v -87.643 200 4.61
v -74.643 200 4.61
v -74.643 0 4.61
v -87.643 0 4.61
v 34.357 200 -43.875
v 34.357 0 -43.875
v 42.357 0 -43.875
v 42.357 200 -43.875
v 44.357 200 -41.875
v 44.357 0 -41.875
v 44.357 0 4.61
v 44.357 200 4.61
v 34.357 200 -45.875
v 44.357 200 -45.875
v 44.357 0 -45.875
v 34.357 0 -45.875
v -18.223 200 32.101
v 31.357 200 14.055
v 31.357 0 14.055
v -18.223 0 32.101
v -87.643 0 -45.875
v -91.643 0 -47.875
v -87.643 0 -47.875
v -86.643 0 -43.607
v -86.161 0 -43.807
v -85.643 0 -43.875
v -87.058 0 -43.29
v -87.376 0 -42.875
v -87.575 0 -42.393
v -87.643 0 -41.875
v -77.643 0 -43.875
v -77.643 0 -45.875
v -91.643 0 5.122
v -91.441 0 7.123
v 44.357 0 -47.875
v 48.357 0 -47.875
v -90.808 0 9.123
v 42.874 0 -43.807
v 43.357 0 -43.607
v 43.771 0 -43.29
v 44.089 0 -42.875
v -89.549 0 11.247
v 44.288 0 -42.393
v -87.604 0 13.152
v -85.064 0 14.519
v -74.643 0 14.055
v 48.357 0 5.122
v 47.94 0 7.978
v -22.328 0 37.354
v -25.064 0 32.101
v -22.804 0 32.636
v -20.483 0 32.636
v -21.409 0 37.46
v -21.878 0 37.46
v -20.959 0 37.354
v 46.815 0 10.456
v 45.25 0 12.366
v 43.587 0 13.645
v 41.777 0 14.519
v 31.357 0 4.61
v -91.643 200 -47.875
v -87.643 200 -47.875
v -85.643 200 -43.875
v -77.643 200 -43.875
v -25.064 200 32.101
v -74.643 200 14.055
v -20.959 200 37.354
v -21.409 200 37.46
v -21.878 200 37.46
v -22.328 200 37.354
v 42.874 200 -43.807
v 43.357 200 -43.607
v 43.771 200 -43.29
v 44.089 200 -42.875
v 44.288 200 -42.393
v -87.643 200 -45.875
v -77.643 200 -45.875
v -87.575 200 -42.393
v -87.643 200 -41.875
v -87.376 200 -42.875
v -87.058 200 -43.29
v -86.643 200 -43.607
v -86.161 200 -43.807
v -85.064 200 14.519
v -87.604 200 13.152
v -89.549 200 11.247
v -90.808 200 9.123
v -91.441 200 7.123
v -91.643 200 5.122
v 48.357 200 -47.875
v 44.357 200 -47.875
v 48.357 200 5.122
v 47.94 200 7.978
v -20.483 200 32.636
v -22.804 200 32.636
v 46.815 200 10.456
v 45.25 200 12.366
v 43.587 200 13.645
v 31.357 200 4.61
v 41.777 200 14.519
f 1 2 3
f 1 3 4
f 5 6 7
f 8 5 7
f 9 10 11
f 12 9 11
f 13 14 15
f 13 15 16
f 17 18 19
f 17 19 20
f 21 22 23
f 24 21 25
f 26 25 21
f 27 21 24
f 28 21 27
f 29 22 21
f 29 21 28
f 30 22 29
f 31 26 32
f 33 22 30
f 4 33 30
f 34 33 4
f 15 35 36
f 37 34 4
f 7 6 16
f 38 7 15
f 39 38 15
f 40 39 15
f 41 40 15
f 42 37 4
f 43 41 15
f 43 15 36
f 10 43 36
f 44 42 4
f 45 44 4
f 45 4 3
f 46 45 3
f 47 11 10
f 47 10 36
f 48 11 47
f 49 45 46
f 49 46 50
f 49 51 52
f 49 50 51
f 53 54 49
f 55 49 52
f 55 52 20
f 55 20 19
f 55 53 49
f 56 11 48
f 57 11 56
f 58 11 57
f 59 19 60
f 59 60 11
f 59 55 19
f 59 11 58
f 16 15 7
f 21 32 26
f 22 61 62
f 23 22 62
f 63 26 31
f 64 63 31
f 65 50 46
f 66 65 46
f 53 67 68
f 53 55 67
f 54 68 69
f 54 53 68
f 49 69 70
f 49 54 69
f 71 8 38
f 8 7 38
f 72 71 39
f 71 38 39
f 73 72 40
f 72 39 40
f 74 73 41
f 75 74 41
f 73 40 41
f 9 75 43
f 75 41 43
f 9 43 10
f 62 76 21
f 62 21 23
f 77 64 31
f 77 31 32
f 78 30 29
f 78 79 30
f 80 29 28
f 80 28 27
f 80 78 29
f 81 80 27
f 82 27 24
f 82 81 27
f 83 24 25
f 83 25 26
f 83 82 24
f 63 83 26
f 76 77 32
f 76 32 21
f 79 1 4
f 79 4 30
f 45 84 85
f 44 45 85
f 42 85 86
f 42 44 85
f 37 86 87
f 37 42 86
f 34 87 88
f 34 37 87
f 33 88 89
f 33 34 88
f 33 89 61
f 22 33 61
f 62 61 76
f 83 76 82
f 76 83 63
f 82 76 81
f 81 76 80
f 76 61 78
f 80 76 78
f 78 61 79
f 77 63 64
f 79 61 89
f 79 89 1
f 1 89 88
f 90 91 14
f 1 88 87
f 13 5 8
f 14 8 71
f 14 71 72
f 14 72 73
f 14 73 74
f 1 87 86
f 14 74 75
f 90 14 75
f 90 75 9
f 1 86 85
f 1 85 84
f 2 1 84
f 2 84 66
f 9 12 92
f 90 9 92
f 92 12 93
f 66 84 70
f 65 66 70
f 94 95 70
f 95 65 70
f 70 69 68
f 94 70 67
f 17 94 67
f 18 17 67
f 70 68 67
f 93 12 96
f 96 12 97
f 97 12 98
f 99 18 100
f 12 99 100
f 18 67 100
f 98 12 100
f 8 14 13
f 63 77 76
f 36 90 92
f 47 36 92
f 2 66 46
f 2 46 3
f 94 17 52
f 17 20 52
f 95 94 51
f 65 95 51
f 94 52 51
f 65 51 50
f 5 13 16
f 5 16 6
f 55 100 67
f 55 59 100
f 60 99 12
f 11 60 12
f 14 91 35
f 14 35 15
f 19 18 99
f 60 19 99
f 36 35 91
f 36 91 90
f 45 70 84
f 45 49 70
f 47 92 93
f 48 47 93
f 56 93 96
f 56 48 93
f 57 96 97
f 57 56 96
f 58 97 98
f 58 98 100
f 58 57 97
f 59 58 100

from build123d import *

# Parameters (mm, degrees)
SHELL1_T            = -4
FILLET1_R           = 10
BOSS_EXTRUDE4_DEPTH = 200
CUT_EXTRUDE1_DEPTH  = 200
FILLET3_R           = 2


with BuildPart() as part:
    # Sketch3 for Loft1 → Loft1 section 0
    with BuildSketch(Plane(origin=(0, 200, 0), x_dir=(1, 0, 0), z_dir=(0, 1, 0))):
        with BuildLine():
            Line((-91.643479102, 47.875432933), (48.356520898, 47.875432933))
            Line((48.356520898, 47.875432933), (48.356520898, -5.122491685))
            # circular arc as an exact rational Bezier (weights 1, cos(half-angle), 1)
            Bezier((48.356520898, -5.122491685), (48.356520898, -12.124567067), (41.776722331, -14.519417892), weights=[1, 0.819152044, 1])
            Line((41.776722331, -14.519417892), (-20.959438815, -37.353513162))
            Bezier((-20.959438815, -37.353513162), (-21.643479102, -37.602483465), (-22.327519388, -37.353513162), weights=[1, 0.939692621, 1])
            Line((-22.327519388, -37.353513162), (-85.063680535, -14.519417892))
            Bezier((-85.063680535, -14.519417892), (-91.643479102, -12.124567067), (-91.643479102, -5.122491685), weights=[1, 0.819152044, 1])
            Line((-91.643479102, -5.122491685), (-91.643479102, 47.875432933))
        make_face()
    # Sketch2 for Loft1 → Loft1 section 1
    with BuildSketch(Plane(origin=(0, 0, 0), x_dir=(1, 0, 0), z_dir=(0, 1, 0))):
        with BuildLine():
            Line((-91.643479102, 47.875432933), (48.356520898, 47.875432933))
            Line((48.356520898, 47.875432933), (48.356520898, -5.122491685))
            Bezier((48.356520898, -5.122491685), (48.356520898, -12.124567067), (41.776722331, -14.519417892), weights=[1, 0.819152044, 1])
            Line((41.776722331, -14.519417892), (-20.959438815, -37.353513162))
            Bezier((-20.959438815, -37.353513162), (-21.643479102, -37.602483465), (-22.327519388, -37.353513162), weights=[1, 0.939692621, 1])
            Line((-22.327519388, -37.353513162), (-85.063680535, -14.519417892))
            Bezier((-85.063680535, -14.519417892), (-91.643479102, -12.124567067), (-91.643479102, -5.122491685), weights=[1, 0.819152044, 1])
            Line((-91.643479102, -5.122491685), (-91.643479102, 47.875432933))
        make_face()
    loft()

    # Shell1
    shell1_openings = [part.faces().sort_by_distance(p)[0] for p in [
        (-21.643479102, 0, -11.173558068),
        (-21.643479102, 200, -11.173558068),
    ]]
    offset(amount=SHELL1_T, openings=shell1_openings)

    # Fillet1
    fillet1_edges = [part.edges().sort_by_distance(p)[0] for p in [
        (-21.643479102, 100, 33.345772375),
    ]]
    fillet(fillet1_edges, radius=FILLET1_R)

    # Sketch7 → Boss-Extrude4 (add)
    with BuildSketch(Plane(origin=(0, 200, 0), x_dir=(1, 0, 0), z_dir=(0, 1, 0))):
        Polygon((46.356653815, -4.610276577), (46.356653815, -9.110276577), (31.356653815, -14.569830091), (31.356653815, -4.610276577), align=None)
        Polygon((-89.643479632, -4.610276577), (-89.643479632, -9.110276577), (-74.643479632, -14.569830091), (-74.643479632, -4.610276577), align=None)
    extrude(amount=-BOSS_EXTRUDE4_DEPTH)

    # Sketch8 → Cut-Extrude1 (cut)
    with BuildSketch(Plane(origin=(0, 200, 0), x_dir=(1, 0, 0), z_dir=(0, 1, 0))):
        Polygon((-87.643479102, 47.875432933), (-77.643479102, 47.875432933), (34.356520898, 47.875432933), (44.356520898, 47.875432933), (44.356520898, 45.875432933), (34.356520898, 45.875432933), (34.356520898, 43.875432933), (-77.643479102, 43.875432933), (-77.643479102, 45.875432933), (-87.643479102, 45.875432933), align=None)
    extrude(amount=-CUT_EXTRUDE1_DEPTH, mode=Mode.SUBTRACT)

    # Fillet3
    fillet3_edges = [part.edges().sort_by_distance(p)[0] for p in [
        (44.356520898, 100, -43.875432933),
        (-87.643479102, 100, -43.875432933),
    ]]
    fillet(fillet3_edges, radius=FILLET3_R)


solid = part.part
